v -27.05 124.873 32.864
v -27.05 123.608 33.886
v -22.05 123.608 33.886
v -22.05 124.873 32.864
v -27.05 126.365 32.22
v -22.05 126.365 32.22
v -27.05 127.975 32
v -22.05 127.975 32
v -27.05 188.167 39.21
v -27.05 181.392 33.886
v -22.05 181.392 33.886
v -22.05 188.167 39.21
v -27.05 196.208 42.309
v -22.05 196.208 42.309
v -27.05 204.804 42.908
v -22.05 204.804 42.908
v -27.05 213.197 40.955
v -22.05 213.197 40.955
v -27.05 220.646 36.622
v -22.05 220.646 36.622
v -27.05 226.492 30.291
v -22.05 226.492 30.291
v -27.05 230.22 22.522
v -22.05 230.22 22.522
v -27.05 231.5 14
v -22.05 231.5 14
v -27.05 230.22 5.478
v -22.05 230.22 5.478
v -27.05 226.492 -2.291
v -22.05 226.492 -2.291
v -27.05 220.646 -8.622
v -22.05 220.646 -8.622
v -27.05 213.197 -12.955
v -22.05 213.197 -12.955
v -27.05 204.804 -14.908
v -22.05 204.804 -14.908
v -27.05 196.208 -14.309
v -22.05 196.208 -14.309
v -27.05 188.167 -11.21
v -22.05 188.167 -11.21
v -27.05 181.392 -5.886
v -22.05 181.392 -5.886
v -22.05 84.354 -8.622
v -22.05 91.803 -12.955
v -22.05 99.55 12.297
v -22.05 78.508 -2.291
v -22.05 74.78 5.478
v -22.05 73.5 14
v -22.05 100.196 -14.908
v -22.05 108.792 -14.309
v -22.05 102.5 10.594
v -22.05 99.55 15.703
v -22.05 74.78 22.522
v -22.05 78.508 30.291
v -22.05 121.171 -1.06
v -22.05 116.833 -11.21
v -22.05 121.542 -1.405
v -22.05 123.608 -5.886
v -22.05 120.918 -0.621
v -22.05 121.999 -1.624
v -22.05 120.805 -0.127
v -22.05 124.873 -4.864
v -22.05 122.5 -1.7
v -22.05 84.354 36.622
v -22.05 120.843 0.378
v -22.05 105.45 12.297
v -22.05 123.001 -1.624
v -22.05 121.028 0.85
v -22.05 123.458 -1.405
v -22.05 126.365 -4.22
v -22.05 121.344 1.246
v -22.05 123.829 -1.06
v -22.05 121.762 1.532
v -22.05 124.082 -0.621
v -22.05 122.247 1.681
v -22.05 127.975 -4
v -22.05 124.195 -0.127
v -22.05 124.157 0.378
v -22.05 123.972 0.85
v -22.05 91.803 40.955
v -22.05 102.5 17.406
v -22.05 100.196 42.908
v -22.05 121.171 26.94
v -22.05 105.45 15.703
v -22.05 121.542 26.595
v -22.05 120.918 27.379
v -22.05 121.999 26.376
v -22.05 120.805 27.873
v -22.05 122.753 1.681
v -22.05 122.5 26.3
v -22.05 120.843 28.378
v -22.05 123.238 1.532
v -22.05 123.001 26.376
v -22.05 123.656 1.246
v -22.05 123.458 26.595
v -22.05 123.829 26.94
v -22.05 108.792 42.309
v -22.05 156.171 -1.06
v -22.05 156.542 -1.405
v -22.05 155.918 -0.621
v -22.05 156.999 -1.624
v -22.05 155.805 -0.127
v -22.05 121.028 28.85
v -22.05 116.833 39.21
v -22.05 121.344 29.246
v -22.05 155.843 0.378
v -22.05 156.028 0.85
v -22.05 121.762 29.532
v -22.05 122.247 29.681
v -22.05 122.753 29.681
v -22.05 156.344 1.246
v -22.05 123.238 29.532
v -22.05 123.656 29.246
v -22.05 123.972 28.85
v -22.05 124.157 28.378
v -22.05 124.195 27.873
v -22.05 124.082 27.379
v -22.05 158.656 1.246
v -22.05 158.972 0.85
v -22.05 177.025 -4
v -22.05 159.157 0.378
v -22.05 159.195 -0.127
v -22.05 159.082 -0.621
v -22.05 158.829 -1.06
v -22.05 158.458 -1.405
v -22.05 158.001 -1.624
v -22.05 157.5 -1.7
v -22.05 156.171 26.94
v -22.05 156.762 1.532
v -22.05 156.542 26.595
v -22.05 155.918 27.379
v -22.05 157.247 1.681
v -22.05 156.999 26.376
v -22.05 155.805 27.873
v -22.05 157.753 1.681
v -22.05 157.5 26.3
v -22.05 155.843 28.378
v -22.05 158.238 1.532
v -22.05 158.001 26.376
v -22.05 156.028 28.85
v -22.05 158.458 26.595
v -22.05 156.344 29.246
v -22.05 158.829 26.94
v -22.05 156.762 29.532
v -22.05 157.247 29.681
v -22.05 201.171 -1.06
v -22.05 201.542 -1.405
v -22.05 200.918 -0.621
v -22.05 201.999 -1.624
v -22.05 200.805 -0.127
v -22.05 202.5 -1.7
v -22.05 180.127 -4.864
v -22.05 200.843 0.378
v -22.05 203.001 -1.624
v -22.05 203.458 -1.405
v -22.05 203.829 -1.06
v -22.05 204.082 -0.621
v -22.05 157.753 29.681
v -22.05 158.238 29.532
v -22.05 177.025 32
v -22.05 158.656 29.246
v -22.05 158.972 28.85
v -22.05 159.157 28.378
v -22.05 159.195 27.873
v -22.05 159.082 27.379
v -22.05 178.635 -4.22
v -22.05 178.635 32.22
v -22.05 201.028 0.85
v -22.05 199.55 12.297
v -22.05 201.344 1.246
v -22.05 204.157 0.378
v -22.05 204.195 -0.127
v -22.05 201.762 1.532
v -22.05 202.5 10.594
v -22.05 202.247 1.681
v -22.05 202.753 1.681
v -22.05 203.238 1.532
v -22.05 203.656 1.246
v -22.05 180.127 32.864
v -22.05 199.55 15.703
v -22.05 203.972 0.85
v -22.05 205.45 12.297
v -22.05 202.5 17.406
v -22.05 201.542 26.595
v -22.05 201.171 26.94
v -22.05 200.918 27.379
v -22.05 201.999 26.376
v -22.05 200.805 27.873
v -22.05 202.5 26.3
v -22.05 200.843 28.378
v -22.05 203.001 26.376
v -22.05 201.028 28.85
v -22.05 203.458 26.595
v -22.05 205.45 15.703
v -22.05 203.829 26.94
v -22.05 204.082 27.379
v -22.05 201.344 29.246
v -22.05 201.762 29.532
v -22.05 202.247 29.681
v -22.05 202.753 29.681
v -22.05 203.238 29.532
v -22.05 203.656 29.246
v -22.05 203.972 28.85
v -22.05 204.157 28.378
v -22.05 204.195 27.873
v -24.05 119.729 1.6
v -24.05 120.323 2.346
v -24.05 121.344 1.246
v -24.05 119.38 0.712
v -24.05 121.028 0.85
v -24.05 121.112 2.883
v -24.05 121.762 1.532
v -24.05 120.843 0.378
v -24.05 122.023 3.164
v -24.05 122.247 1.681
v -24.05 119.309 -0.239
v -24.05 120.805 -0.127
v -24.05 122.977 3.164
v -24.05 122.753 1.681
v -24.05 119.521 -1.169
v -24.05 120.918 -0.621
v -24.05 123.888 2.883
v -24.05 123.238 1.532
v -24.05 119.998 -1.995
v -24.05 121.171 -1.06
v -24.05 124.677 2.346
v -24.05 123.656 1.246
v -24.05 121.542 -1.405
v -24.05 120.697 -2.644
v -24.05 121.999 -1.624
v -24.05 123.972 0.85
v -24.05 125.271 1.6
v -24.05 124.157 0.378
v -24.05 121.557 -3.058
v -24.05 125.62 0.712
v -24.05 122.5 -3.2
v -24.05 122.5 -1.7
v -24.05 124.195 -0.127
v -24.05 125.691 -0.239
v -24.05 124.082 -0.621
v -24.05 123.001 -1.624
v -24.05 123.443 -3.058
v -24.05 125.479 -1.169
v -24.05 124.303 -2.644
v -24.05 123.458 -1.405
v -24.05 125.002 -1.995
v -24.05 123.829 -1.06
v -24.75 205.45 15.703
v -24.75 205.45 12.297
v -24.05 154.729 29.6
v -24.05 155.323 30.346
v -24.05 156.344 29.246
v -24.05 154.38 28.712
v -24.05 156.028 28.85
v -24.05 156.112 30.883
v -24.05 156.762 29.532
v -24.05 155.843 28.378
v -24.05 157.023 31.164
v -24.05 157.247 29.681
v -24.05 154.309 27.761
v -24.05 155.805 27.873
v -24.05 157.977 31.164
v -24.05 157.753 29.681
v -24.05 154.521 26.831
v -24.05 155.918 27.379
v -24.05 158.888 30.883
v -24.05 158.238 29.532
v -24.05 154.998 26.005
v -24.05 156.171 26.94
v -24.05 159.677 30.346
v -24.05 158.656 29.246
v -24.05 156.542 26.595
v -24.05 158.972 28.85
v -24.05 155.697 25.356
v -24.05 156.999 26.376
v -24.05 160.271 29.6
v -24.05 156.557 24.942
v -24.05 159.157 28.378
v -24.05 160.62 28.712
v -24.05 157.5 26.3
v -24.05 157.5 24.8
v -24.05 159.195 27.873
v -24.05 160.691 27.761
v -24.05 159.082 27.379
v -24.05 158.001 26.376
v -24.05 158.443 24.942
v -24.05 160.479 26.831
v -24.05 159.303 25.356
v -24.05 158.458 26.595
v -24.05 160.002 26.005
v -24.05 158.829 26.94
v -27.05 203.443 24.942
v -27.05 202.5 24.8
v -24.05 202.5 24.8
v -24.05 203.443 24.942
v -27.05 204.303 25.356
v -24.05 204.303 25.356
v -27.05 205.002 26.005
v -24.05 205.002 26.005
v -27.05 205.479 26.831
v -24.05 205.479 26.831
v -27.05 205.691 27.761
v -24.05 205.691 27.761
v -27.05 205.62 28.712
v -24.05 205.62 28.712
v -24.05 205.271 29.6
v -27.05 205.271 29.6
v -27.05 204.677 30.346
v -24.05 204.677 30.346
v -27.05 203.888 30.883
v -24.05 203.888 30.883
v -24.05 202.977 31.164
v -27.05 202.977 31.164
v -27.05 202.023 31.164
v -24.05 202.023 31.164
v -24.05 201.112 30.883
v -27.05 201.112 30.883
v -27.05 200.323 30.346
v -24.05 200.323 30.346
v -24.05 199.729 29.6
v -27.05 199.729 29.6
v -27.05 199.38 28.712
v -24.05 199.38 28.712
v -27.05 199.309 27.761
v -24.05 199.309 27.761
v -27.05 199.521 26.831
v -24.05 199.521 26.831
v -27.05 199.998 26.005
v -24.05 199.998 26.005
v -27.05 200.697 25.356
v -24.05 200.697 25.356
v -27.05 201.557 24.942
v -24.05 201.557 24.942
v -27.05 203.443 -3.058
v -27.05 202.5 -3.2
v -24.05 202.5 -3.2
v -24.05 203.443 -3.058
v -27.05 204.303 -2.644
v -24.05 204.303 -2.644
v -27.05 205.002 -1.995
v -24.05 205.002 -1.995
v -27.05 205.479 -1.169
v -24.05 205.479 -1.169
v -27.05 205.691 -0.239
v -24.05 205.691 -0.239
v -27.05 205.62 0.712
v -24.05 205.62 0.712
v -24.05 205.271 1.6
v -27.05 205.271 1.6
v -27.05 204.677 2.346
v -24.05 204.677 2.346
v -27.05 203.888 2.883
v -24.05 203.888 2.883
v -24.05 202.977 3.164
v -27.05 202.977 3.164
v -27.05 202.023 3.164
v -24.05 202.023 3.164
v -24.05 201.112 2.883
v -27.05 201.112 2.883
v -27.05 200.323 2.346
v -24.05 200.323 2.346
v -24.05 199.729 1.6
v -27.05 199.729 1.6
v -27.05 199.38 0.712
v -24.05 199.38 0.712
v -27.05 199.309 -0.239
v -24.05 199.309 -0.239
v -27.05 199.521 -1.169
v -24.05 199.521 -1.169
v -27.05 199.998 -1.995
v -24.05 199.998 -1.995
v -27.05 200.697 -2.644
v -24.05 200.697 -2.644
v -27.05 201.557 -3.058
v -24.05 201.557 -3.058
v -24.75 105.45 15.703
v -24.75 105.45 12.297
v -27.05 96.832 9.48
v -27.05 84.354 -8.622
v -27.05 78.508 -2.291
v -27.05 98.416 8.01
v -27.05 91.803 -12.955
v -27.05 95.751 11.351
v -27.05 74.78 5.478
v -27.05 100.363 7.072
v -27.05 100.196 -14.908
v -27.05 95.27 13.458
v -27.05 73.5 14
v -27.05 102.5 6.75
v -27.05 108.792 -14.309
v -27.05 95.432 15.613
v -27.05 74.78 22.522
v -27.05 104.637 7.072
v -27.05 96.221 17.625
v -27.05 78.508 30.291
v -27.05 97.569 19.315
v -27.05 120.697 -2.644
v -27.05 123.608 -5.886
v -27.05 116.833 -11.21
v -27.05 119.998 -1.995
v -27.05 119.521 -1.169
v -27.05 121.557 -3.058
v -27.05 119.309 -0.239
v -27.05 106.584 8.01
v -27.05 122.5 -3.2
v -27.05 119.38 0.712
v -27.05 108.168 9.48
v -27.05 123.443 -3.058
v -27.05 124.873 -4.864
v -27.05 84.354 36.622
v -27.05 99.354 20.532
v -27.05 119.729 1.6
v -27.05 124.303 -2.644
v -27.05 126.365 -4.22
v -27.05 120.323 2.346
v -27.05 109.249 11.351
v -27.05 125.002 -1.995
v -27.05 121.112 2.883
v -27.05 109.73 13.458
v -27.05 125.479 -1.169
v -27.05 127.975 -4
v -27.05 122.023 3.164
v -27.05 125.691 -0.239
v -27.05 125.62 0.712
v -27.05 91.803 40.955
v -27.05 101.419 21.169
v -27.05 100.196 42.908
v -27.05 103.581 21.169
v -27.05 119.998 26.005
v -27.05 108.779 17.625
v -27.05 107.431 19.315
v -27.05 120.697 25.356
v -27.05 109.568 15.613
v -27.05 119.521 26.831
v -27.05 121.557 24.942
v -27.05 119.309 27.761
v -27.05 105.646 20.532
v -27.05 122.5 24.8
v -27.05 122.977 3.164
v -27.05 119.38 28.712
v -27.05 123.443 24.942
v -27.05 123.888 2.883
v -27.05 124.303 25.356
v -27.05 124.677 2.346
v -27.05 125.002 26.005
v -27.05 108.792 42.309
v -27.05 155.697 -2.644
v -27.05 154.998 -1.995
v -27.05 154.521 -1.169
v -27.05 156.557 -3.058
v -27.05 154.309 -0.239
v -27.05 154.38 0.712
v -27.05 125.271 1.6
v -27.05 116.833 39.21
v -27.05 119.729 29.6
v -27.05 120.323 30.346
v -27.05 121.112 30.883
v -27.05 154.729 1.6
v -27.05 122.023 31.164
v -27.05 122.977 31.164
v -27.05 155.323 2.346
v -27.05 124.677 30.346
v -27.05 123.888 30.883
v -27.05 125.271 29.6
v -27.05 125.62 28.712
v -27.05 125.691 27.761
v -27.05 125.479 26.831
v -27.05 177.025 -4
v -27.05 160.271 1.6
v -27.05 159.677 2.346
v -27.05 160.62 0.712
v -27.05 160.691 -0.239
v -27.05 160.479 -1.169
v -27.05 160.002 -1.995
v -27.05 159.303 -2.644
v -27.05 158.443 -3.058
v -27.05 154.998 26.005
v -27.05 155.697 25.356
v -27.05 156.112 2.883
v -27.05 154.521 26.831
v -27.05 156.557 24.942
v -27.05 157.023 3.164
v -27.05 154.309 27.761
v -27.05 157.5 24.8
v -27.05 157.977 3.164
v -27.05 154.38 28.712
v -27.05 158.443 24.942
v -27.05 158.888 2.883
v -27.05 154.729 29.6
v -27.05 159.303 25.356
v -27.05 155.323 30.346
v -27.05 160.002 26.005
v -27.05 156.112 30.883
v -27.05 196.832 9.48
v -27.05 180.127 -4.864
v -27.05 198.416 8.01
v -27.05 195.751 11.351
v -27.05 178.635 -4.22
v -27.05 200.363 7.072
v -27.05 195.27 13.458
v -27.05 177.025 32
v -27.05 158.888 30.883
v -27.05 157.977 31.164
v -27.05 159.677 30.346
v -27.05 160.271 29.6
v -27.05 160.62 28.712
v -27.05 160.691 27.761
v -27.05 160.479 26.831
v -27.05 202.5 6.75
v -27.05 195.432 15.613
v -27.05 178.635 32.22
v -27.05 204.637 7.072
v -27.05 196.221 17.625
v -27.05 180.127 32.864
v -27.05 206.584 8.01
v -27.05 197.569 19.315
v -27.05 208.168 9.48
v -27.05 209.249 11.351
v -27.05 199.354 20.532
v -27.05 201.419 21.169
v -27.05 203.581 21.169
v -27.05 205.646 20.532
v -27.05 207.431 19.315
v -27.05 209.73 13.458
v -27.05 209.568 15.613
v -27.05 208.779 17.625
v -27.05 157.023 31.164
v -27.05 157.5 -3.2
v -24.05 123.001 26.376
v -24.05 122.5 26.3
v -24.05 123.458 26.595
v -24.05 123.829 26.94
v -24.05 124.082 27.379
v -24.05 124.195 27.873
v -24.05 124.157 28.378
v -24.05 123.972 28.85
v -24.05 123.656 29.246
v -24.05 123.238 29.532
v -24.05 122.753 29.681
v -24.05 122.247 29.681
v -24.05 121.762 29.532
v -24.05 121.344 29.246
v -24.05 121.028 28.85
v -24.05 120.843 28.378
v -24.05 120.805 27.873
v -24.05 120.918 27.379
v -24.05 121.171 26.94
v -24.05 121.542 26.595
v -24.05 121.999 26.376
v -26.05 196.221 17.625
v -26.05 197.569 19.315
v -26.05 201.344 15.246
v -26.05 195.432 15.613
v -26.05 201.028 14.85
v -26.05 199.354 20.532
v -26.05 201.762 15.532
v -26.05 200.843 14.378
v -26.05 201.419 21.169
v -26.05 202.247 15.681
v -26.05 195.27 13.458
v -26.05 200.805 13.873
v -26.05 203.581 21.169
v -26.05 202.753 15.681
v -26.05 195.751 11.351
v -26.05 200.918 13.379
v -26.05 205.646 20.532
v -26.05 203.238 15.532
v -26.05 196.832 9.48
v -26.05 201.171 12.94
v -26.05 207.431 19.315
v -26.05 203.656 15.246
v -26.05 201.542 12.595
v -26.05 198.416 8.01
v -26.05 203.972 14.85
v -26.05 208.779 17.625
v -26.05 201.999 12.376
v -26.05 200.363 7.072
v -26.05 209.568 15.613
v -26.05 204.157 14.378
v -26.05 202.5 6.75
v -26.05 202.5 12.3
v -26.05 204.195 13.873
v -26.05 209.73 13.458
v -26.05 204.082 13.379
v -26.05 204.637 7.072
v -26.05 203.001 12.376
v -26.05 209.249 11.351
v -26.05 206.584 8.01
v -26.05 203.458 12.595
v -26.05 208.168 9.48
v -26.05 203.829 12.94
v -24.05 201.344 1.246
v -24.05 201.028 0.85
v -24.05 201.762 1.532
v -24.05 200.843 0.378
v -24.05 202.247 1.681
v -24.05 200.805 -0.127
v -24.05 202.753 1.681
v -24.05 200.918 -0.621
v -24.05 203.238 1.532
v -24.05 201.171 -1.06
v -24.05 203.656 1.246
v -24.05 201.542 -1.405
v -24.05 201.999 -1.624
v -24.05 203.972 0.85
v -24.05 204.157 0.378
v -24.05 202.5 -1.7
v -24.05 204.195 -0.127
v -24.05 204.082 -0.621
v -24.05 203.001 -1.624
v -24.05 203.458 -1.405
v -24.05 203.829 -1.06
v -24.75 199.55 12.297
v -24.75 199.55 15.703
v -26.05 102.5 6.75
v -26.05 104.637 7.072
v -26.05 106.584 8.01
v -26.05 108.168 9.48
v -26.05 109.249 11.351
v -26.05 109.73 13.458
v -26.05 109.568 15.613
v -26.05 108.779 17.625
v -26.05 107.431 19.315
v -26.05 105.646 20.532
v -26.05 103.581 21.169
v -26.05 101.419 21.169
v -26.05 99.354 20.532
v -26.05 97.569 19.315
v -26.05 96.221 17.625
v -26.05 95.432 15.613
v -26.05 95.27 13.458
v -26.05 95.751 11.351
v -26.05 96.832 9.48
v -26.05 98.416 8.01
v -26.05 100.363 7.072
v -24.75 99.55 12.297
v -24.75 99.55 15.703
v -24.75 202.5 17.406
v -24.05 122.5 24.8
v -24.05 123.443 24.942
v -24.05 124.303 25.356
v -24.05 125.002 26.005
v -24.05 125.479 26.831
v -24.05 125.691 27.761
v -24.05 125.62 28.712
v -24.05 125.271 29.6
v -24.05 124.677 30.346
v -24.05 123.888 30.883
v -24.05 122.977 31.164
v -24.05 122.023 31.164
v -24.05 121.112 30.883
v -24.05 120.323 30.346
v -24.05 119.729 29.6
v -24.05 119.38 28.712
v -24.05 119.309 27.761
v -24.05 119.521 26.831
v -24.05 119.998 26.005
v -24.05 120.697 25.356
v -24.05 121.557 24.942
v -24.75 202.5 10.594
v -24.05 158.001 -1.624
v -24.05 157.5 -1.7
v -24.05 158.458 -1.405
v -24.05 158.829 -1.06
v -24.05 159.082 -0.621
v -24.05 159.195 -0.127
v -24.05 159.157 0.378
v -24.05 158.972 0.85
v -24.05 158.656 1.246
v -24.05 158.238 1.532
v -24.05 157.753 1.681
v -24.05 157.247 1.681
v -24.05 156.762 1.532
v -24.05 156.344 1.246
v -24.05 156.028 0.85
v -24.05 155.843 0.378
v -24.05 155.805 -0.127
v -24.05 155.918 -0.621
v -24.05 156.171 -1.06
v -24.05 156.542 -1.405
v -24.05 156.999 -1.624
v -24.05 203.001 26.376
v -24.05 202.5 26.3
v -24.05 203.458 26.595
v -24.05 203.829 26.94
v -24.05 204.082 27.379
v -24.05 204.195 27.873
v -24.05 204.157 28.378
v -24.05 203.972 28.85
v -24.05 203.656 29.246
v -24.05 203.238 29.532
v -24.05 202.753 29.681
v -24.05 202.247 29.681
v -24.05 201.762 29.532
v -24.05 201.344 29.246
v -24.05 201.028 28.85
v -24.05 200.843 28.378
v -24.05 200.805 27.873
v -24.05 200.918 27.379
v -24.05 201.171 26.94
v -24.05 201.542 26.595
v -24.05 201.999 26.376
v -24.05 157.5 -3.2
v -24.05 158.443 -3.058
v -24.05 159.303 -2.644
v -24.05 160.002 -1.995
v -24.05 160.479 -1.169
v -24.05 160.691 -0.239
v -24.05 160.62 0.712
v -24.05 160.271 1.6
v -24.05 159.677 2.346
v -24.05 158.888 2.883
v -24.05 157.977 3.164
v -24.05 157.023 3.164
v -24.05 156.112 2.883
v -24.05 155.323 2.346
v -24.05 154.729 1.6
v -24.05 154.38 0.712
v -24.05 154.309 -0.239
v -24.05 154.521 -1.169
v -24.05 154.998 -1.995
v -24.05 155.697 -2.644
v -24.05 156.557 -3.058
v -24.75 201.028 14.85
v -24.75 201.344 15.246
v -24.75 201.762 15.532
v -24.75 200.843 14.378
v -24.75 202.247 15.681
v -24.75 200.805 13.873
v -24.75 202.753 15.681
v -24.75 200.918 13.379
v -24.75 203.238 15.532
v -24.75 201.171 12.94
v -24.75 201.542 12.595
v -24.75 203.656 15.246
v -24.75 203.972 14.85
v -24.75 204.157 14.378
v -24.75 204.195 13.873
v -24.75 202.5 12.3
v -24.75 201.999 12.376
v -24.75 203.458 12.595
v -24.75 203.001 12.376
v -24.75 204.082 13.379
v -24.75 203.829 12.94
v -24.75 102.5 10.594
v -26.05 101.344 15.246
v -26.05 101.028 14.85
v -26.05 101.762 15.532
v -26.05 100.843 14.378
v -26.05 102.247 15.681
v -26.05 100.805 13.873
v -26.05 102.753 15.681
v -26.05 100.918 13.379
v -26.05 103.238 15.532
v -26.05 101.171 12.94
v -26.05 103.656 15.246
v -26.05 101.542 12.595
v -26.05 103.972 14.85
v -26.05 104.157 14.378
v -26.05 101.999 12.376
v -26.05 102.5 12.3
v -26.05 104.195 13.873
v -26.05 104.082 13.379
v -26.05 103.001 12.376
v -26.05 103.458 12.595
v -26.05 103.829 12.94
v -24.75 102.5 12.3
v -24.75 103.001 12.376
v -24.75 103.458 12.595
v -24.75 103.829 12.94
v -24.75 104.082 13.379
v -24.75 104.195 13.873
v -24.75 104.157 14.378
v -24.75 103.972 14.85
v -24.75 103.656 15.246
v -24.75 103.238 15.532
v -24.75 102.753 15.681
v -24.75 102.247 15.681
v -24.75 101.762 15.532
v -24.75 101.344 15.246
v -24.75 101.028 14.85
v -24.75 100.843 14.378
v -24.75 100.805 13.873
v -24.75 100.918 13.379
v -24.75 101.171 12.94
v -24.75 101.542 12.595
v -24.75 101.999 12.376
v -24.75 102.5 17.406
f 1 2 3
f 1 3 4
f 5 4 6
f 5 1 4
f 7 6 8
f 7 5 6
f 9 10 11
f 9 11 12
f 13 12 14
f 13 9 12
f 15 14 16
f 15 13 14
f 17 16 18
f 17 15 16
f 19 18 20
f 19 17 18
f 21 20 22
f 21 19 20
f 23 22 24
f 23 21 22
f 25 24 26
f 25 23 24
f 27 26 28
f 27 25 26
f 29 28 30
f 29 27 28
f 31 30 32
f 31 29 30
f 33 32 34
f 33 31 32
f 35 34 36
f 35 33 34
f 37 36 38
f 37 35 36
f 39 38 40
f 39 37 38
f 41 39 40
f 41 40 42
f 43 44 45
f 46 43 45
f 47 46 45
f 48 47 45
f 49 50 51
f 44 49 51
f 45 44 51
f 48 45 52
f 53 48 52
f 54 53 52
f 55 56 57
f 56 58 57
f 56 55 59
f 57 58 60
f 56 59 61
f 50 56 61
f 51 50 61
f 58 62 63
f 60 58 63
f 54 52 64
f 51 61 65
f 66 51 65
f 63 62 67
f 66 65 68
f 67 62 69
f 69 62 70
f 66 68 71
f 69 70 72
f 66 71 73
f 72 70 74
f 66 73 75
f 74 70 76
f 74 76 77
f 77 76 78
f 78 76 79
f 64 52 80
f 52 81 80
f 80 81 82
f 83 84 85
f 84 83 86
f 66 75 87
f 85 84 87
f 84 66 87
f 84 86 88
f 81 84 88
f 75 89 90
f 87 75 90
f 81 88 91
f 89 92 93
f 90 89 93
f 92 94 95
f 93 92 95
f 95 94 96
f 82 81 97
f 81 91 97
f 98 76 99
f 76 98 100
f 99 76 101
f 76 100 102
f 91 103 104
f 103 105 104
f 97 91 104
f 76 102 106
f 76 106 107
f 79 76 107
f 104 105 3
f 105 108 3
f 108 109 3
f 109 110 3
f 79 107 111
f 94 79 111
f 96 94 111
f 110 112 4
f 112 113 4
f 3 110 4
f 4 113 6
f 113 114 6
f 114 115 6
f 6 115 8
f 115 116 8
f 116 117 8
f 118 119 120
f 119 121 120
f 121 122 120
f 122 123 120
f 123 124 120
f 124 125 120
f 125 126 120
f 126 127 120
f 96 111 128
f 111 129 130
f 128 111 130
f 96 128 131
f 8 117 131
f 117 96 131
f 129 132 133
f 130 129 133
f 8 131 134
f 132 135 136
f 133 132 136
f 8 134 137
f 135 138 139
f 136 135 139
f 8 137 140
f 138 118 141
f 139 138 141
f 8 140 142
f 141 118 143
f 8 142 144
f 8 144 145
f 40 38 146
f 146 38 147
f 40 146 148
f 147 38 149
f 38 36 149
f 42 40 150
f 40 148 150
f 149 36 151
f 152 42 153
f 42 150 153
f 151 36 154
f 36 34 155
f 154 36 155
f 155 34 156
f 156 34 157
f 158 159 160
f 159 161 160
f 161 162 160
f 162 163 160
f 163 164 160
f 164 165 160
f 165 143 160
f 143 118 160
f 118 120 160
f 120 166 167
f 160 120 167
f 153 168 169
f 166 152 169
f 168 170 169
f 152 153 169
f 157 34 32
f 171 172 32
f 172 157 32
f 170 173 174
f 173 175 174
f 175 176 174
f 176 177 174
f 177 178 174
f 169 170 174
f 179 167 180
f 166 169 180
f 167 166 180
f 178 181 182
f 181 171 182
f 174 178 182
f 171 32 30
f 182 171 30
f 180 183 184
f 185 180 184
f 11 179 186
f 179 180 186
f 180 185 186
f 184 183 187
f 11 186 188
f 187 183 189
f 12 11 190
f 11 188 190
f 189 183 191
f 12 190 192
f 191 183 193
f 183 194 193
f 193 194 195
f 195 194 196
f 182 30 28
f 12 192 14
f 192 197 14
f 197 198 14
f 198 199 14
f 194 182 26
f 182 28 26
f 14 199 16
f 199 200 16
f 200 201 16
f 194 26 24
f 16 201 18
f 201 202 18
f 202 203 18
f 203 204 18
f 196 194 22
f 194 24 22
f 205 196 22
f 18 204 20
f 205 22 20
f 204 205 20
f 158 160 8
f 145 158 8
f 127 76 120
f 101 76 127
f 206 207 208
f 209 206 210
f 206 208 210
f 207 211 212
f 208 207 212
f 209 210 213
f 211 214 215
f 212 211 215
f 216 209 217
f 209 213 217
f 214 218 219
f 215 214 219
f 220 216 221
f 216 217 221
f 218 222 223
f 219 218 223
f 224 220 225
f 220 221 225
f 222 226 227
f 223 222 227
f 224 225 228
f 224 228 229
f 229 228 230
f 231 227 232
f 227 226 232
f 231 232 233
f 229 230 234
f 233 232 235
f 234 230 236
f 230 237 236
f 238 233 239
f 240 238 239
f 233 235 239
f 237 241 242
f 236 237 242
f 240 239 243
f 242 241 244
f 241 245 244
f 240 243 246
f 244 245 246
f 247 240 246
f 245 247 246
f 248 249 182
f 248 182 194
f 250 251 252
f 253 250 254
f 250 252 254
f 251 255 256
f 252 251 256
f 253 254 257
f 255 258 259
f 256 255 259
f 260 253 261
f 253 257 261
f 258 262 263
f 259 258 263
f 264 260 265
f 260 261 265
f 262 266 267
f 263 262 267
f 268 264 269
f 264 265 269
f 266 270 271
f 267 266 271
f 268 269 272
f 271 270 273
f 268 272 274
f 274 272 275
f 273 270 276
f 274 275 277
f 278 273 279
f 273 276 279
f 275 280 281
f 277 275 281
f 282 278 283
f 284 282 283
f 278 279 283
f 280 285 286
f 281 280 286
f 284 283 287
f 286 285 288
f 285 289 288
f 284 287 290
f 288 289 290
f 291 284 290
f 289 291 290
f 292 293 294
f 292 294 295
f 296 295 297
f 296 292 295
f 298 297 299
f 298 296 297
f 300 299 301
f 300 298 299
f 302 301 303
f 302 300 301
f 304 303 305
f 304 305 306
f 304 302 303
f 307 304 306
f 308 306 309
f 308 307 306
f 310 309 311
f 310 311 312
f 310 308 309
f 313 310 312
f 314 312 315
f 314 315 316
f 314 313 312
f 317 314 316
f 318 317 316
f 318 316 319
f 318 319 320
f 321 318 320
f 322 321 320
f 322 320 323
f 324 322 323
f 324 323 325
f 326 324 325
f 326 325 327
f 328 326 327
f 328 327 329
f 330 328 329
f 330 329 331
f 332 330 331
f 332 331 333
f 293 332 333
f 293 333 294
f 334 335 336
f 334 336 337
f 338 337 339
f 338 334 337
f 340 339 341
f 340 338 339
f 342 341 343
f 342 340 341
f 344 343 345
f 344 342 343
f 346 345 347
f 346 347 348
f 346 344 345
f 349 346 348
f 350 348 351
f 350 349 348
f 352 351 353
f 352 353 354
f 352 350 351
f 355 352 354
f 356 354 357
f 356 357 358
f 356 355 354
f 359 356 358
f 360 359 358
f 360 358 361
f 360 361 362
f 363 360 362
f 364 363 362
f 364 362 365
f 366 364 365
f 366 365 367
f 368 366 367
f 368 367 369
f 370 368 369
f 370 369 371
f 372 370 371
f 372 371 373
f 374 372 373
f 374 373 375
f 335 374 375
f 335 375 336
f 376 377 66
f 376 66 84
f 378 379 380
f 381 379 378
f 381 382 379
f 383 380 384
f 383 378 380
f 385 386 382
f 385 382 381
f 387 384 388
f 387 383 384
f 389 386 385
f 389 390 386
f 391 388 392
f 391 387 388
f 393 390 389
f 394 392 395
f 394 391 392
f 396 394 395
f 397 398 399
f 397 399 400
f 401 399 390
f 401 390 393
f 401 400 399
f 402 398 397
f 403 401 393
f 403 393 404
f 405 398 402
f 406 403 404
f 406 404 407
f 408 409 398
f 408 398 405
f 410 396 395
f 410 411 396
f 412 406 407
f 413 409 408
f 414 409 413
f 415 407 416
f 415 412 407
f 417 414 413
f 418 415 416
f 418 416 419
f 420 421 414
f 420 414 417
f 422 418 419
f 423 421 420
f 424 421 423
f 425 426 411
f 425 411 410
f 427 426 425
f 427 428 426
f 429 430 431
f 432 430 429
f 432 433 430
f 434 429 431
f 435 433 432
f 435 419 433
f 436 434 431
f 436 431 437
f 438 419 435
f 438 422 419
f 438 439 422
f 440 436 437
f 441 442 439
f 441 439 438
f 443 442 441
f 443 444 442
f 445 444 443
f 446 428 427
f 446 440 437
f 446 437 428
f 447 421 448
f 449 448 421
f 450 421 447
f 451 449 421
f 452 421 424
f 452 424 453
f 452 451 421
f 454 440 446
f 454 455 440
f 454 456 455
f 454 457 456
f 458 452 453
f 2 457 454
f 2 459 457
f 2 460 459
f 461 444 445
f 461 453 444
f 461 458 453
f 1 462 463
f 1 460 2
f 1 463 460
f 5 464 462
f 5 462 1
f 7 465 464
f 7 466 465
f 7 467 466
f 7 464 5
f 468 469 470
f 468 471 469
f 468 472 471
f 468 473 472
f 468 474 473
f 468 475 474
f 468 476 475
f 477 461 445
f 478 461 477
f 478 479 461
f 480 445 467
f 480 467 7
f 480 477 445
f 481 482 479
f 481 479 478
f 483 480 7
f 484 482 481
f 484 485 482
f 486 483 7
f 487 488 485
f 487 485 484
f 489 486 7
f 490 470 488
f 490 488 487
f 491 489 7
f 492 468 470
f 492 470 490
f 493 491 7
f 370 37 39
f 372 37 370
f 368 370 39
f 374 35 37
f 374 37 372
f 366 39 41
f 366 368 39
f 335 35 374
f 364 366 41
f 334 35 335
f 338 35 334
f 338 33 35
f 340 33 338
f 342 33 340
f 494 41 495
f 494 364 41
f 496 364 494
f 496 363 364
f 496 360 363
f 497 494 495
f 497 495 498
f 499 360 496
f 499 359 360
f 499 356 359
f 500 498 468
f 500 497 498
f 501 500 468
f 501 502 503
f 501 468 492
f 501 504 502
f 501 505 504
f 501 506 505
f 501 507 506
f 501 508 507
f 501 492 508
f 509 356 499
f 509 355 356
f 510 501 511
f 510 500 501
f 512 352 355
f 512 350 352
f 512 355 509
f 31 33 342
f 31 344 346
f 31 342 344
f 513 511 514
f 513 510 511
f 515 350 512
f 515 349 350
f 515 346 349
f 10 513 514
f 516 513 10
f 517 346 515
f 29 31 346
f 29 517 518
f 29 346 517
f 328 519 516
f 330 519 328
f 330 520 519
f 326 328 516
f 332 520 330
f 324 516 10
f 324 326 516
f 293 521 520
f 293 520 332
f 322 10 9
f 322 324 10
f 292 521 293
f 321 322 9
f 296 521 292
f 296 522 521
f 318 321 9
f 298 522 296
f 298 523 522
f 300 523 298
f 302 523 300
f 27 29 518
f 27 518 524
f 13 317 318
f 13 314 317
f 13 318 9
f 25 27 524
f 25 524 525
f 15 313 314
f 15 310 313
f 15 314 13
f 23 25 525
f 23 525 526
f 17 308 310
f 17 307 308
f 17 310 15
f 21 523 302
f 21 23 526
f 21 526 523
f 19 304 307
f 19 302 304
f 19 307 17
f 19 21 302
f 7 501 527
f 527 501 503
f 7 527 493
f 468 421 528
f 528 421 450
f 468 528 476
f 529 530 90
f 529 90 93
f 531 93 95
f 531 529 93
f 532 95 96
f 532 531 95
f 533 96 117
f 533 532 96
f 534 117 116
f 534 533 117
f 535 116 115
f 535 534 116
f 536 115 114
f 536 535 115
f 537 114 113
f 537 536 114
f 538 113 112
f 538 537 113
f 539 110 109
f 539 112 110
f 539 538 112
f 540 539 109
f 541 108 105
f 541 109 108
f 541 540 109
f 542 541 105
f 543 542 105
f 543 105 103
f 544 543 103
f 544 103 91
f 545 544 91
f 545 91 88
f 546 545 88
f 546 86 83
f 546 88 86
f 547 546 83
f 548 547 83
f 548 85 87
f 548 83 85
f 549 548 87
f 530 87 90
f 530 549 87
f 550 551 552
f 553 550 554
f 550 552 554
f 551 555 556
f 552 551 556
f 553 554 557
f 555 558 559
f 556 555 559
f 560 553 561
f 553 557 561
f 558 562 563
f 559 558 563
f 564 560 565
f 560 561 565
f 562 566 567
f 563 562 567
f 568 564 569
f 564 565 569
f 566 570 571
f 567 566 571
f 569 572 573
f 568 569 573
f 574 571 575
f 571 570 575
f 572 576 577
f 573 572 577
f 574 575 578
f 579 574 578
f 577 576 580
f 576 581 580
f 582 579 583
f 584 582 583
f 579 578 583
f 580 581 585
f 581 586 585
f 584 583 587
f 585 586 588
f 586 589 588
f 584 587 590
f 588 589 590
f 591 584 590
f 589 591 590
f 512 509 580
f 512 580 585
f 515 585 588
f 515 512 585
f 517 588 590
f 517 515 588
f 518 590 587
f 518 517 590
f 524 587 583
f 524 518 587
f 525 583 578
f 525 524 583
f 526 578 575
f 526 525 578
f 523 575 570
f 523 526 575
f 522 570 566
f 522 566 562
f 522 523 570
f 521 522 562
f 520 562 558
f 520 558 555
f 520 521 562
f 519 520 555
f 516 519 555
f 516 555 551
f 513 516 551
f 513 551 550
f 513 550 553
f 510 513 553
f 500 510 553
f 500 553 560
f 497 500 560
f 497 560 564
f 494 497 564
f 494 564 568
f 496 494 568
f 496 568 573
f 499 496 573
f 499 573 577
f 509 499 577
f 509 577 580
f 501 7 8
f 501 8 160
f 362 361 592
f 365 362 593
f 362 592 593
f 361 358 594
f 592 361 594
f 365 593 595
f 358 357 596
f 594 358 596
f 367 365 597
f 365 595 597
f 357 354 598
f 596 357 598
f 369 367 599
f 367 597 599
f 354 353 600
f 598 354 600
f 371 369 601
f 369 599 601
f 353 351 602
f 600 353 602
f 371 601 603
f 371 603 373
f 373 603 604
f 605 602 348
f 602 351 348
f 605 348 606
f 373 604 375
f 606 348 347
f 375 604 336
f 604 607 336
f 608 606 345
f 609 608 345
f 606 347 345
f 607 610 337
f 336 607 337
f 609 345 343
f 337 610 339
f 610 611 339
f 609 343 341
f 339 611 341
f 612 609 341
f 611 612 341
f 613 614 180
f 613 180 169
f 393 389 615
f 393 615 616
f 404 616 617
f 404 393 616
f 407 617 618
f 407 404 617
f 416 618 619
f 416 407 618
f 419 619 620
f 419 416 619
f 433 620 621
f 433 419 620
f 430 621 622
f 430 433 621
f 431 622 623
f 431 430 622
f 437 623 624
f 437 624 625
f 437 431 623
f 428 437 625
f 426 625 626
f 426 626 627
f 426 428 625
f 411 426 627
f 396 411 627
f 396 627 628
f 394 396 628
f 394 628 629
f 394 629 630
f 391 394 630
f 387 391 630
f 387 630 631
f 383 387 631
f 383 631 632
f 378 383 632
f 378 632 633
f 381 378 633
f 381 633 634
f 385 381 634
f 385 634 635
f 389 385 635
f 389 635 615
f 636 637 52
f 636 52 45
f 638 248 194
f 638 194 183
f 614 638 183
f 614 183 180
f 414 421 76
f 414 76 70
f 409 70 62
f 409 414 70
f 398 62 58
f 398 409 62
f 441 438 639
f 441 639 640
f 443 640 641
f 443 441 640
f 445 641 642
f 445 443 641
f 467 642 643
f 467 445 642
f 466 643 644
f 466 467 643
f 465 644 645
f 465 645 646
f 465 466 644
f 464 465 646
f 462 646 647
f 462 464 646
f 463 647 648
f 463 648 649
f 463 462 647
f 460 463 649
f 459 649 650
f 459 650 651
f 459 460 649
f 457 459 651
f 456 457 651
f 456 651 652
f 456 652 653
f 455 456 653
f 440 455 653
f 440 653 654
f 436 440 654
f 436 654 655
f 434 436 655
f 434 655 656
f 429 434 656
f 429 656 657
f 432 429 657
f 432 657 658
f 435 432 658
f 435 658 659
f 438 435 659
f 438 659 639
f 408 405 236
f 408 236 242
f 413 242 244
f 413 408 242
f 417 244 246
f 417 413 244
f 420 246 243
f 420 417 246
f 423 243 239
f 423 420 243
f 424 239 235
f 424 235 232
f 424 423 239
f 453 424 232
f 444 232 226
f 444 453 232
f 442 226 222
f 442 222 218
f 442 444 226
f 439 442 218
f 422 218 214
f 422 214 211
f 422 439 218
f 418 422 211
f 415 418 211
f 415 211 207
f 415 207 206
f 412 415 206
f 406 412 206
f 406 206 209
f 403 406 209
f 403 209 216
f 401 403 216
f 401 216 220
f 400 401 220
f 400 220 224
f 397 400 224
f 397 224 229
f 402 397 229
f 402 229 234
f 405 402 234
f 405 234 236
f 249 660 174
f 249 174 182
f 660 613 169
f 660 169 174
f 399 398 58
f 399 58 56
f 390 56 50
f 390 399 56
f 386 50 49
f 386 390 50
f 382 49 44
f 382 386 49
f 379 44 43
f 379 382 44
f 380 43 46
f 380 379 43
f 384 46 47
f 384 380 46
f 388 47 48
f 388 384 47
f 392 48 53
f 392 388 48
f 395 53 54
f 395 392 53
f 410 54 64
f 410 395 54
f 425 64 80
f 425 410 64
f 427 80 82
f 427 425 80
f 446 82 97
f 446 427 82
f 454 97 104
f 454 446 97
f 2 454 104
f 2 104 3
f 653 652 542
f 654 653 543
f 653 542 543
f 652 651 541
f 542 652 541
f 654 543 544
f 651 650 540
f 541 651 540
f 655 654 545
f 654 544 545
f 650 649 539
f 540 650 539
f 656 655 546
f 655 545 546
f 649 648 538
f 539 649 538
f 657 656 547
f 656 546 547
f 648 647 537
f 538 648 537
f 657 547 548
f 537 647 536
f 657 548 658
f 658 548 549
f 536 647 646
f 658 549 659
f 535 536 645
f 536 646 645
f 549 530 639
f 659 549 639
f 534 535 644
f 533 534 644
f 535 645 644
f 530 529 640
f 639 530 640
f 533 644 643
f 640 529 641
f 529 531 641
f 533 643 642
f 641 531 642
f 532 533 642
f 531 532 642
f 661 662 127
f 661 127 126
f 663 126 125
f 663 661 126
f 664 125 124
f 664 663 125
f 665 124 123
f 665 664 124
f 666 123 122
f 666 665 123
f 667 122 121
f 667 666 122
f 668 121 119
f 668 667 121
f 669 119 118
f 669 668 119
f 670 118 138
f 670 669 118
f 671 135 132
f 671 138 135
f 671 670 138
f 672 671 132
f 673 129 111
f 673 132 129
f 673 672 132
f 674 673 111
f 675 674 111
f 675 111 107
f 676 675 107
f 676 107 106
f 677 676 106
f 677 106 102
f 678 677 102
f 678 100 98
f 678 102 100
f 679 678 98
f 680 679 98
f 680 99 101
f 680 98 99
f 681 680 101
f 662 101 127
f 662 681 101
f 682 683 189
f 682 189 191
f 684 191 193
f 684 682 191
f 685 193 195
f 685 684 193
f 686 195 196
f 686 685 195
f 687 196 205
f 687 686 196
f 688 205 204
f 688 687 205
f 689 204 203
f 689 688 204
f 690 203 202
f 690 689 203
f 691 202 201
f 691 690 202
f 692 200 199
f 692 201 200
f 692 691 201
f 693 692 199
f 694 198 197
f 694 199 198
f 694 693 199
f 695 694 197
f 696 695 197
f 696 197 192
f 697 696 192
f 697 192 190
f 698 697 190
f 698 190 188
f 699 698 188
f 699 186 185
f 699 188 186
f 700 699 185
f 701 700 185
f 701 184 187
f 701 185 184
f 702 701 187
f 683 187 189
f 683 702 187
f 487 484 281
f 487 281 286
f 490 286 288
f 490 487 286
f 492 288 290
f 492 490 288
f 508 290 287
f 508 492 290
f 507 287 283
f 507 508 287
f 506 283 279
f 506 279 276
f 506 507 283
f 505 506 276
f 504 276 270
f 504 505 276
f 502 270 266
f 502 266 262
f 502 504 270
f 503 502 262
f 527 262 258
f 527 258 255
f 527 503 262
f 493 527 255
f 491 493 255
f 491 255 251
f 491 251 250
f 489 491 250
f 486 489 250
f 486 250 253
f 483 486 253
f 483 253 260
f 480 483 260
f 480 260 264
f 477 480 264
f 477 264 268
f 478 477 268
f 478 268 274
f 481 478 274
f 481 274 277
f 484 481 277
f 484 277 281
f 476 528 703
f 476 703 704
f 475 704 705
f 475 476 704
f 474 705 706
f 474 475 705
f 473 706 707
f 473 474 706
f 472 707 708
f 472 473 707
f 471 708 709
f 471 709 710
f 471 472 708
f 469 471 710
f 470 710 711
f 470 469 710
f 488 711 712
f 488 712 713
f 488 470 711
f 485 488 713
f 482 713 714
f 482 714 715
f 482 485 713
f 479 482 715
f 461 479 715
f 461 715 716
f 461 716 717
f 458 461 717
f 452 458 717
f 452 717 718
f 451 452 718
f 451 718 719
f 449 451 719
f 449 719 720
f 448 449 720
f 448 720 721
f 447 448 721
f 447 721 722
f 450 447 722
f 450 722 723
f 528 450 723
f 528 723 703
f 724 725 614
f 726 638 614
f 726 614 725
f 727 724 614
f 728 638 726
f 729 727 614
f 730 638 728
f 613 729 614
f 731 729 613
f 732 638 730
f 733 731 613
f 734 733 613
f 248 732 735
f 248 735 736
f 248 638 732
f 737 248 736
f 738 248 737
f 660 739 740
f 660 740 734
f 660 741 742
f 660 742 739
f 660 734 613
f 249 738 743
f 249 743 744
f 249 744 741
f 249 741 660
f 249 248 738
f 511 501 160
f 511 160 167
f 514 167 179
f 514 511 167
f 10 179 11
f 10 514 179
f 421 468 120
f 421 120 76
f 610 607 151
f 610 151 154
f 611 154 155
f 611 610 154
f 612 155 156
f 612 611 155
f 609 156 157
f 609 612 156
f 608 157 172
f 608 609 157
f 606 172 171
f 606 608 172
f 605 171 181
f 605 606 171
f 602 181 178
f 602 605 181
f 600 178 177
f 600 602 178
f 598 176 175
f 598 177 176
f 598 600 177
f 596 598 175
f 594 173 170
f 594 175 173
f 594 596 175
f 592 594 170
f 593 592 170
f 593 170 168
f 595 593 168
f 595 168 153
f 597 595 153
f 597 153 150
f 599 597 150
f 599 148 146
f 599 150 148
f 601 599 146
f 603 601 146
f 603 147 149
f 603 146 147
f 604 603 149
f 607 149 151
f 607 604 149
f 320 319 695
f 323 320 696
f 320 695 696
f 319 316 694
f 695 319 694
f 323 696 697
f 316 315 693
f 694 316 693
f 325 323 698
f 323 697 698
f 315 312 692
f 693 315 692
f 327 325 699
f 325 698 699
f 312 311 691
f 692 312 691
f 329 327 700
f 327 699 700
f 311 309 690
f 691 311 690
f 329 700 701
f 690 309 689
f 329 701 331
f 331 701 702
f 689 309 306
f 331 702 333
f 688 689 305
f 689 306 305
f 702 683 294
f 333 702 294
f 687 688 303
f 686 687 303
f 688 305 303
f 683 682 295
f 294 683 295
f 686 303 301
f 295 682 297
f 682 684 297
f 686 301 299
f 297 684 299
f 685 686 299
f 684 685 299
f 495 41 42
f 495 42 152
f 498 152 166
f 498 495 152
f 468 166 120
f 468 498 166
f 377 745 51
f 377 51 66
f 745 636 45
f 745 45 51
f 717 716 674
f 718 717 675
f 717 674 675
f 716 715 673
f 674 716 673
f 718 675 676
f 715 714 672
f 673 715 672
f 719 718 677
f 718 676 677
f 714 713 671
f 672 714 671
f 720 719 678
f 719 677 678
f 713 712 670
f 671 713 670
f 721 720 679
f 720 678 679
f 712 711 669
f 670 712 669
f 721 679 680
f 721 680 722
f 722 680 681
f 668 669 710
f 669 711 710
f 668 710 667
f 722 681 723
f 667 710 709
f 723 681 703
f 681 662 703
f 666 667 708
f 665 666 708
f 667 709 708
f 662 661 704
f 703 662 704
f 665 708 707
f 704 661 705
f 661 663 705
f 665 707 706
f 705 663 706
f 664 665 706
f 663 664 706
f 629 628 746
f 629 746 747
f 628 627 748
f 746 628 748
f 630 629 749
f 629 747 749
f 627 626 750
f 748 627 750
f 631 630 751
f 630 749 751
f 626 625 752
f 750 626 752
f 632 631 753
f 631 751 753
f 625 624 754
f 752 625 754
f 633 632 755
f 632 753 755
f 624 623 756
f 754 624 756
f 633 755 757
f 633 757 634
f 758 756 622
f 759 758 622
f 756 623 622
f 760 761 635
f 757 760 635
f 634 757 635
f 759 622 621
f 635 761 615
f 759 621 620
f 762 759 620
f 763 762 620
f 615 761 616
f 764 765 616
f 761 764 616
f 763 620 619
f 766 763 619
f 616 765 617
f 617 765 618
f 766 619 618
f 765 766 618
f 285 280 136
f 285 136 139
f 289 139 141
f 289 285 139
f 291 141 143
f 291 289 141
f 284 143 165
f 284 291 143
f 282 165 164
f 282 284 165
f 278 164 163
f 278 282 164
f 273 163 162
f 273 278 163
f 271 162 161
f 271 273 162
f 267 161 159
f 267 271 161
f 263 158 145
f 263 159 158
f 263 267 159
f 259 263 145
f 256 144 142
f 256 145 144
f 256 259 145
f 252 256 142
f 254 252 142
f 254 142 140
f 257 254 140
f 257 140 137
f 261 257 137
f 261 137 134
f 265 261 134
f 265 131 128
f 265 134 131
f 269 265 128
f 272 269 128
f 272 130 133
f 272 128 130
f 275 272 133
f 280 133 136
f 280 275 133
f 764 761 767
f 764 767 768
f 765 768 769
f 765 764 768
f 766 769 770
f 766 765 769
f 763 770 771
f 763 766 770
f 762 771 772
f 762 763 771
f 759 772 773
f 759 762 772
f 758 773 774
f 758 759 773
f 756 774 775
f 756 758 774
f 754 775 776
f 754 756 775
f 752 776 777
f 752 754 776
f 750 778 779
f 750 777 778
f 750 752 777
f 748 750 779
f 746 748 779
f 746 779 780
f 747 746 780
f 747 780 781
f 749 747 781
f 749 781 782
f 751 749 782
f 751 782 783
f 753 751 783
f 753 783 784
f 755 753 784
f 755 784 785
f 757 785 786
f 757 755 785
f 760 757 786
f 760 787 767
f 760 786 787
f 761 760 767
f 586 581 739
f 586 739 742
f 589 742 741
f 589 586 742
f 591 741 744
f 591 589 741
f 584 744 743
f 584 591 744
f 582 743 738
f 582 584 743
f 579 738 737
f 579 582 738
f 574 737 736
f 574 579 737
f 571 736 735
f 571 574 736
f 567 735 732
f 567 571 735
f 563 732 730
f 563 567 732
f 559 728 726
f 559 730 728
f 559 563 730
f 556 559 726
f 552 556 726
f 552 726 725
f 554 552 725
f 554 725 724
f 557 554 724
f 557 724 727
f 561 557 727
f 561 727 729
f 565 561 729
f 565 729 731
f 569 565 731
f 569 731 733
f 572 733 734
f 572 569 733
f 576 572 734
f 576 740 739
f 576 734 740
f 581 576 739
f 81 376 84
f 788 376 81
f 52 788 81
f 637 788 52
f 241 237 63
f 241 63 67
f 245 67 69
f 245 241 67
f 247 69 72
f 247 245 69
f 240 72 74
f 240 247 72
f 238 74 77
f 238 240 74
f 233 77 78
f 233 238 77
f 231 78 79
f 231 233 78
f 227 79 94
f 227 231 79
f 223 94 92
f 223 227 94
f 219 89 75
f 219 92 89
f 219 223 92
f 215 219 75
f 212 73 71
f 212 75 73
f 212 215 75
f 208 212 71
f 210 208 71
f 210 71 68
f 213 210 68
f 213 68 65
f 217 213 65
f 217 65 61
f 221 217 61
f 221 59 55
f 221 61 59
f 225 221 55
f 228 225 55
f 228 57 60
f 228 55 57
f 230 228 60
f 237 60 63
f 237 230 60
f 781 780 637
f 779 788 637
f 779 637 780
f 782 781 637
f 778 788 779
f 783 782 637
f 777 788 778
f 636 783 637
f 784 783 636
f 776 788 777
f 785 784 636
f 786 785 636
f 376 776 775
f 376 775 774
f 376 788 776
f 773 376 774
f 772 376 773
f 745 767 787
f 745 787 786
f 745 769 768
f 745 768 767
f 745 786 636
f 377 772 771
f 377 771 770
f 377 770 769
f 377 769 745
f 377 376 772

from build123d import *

# Parameters (mm, degrees)
PLATE_START        = -27.05
PLATE_B_DEPTH      = 5
PIN_START          = -27.25
SKETCH2_R          = 7.25
PIN_SEATS_DEPTH    = 1.2
BOLT_START         = -27.25
SKETCH3_R          = 1.7
BOLT_HOLES_DEPTH   = 5.4
PIN_START_2        = -24.75
PIN_NUTS_DEPTH     = 2.9
COUNTERBORES_START = -27.25
SKETCH5_R          = 3.2
COUNTERBORES_DEPTH = 3.2


with BuildPart() as part:
    # Sketch1 → Plate B (new body)
    with BuildSketch(Plane(origin=(0, 0, 0), x_dir=(0, 0, -1), z_dir=(1, 0, 0)).offset(PLATE_START)):
        with BuildLine():
            Line((-32, 127.975478406), (-32, 177.024521594))
            ThreePointArc((-32, 177.024521594), (-32.49156491, 179.402996496), (-33.885714286, 181.391746464))
            ThreePointArc((-33.885714286, 181.391746464), (-14, 231.5), (5.885714286, 181.391746464))
            ThreePointArc((5.885714286, 181.391746464), (4.49156491, 179.402996496), (4, 177.024521594))
            Line((4, 177.024521594), (4, 127.975478406))
            ThreePointArc((4, 127.975478406), (4.49156491, 125.597003504), (5.885714286, 123.608253536))
            ThreePointArc((5.885714286, 123.608253536), (-14, 73.5), (-33.885714286, 123.608253536))
            ThreePointArc((-33.885714286, 123.608253536), (-32.49156491, 125.597003504), (-32, 127.975478406))
        make_face()
    extrude(amount=PLATE_B_DEPTH)

    # Sketch2 → Pin seats (cut)
    with BuildSketch(Plane(origin=(0, 0, 0), x_dir=(0, 0, -1), z_dir=(1, 0, 0)).offset(PIN_START)):
        with Locations((-14, 102.5)):
            Circle(SKETCH2_R)
        with Locations((-14, 202.5)):
            Circle(SKETCH2_R)
    extrude(amount=PIN_SEATS_DEPTH, mode=Mode.SUBTRACT)

    # Sketch3 → Bolt holes (cut)
    with BuildSketch(Plane(origin=(0, 0, 0), x_dir=(0, 0, -1), z_dir=(1, 0, 0)).offset(BOLT_START)):
        with Locations((-14, 102.5)):
            Circle(SKETCH3_R)
        with Locations((-14, 202.5)):
            Circle(SKETCH3_R)
        with Locations((0, 122.5)):
            Circle(SKETCH3_R)
        with Locations((-28, 122.5)):
            Circle(SKETCH3_R)
        with Locations((0, 157.5)):
            Circle(SKETCH3_R)
        with Locations((-28, 157.5)):
            Circle(SKETCH3_R)
        with Locations((0, 202.5)):
            Circle(SKETCH3_R)
        with Locations((-28, 202.5)):
            Circle(SKETCH3_R)
    extrude(amount=BOLT_HOLES_DEPTH, mode=Mode.SUBTRACT)

    # Sketch4 → Pin nuts (cut)
    with BuildSketch(Plane(origin=(0, 0, 0), x_dir=(0, 0, -1), z_dir=(1, 0, 0)).offset(PIN_START_2)):
        Polygon((-15.703183294, 105.45), (-17.406366588, 102.5), (-15.703183294, 99.55), (-12.296816706, 99.55), (-10.593633412, 102.5), (-12.296816706, 105.45), align=None)
        Polygon((-15.703183294, 205.45), (-17.406366588, 202.5), (-15.703183294, 199.55), (-12.296816706, 199.55), (-10.593633412, 202.5), (-12.296816706, 205.45), align=None)
    extrude(amount=PIN_NUTS_DEPTH, mode=Mode.SUBTRACT)

    # Sketch5 → Counterbores (cut)
    with BuildSketch(Plane(origin=(0, 0, 0), x_dir=(0, 0, -1), z_dir=(1, 0, 0)).offset(COUNTERBORES_START)):
        with Locations((0, 122.5)):
            Circle(SKETCH5_R)
        with Locations((-28, 122.5)):
            Circle(SKETCH5_R)
        with Locations((0, 157.5)):
            Circle(SKETCH5_R)
        with Locations((-28, 157.5)):
            Circle(SKETCH5_R)
        with Locations((0, 202.5)):
            Circle(SKETCH5_R)
        with Locations((-28, 202.5)):
            Circle(SKETCH5_R)
    extrude(amount=COUNTERBORES_DEPTH, mode=Mode.SUBTRACT)


solid = part.part
